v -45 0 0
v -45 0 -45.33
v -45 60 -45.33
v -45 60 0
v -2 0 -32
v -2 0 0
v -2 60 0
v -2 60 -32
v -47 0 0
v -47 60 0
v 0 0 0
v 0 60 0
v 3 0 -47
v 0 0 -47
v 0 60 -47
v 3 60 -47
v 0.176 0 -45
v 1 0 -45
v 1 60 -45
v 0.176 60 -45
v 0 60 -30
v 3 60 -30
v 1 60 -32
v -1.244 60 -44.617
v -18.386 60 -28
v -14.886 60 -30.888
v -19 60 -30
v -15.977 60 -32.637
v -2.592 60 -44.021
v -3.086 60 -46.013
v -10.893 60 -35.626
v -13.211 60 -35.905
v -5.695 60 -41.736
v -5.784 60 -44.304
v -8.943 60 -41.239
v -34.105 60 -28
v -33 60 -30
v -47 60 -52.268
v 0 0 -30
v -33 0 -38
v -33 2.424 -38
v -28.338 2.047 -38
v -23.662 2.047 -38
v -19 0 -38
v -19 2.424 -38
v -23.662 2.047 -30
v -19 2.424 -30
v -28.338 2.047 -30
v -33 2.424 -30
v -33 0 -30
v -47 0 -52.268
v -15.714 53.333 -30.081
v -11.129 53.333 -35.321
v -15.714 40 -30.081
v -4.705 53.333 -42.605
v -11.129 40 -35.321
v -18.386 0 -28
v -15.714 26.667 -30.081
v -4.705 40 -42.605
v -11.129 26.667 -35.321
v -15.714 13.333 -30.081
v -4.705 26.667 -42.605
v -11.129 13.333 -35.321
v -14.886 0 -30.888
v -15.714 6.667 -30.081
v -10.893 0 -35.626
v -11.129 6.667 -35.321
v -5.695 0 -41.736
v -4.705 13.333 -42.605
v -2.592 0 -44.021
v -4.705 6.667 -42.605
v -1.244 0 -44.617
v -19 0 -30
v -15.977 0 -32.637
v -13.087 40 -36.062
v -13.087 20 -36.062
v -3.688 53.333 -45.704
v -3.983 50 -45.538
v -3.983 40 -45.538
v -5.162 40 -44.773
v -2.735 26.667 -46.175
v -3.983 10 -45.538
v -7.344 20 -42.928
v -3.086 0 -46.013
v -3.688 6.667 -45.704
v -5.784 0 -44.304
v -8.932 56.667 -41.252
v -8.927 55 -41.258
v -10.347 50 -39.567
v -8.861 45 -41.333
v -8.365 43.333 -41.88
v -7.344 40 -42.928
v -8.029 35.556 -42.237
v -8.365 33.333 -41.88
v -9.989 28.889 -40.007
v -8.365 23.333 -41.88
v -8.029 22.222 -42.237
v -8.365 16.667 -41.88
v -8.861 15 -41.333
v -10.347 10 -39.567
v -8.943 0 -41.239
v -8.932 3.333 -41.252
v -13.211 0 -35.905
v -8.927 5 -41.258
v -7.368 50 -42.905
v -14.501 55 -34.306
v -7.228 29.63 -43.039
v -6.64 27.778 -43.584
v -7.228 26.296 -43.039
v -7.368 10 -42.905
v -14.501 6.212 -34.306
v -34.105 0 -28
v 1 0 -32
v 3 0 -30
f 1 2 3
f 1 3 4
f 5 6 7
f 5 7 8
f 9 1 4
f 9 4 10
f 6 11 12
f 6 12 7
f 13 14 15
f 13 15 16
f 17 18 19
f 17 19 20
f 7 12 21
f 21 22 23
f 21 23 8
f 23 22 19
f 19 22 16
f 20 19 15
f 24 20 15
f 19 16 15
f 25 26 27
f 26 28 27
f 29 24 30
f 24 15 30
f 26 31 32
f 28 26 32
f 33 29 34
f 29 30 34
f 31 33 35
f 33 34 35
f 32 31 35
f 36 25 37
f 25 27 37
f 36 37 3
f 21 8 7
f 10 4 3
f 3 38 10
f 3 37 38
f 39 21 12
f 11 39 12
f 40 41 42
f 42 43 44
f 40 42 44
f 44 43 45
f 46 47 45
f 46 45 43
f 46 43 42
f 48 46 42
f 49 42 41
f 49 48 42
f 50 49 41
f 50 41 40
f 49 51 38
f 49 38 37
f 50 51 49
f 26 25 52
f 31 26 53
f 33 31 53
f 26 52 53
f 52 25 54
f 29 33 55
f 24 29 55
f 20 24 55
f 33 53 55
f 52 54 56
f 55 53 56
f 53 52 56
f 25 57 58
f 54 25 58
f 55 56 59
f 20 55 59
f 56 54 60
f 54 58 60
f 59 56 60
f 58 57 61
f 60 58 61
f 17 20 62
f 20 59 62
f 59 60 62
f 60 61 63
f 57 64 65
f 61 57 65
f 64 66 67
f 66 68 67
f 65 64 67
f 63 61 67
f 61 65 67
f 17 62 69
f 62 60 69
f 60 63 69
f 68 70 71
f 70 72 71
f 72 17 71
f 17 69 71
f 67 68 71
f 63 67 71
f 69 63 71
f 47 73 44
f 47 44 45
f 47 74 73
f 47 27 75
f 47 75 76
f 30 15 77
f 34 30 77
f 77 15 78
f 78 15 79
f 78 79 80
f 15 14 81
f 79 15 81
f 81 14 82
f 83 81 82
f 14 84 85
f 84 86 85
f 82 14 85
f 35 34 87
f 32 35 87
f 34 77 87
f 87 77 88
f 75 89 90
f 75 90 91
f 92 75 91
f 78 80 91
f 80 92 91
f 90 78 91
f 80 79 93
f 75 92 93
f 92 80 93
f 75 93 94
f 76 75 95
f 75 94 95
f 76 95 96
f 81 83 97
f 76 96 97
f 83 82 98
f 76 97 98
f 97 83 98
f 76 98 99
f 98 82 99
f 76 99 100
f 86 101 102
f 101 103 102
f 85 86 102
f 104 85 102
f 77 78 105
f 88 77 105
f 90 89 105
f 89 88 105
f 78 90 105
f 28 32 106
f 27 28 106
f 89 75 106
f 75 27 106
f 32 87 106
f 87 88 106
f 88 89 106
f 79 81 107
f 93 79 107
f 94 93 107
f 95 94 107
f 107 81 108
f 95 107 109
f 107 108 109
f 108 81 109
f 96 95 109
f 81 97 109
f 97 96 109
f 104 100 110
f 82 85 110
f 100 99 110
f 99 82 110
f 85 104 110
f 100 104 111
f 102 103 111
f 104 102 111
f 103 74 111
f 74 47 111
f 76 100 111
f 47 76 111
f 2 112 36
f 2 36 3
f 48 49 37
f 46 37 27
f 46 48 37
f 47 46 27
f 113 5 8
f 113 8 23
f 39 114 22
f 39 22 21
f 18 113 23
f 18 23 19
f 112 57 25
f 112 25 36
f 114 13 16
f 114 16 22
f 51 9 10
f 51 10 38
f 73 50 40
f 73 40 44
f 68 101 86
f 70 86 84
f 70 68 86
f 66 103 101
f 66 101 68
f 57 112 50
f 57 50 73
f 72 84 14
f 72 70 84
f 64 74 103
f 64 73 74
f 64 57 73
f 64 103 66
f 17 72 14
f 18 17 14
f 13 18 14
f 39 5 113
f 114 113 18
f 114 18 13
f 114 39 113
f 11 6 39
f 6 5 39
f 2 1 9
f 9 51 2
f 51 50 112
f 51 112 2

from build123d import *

# Parameters (mm, degrees)
BOSS_EXTRUDE12_DEPTH = 60
BOSS_EXTRUDE13_DEPTH = 8


with BuildPart() as part:
    # Sketch1 → Boss-Extrude12 (new body)
    with BuildSketch(Plane(origin=(0, 0, 0), x_dir=(1, 0, 0), z_dir=(0, 1, 0))):
        with BuildLine():
            Line((3, 47), (3, 30))
            Line((3, 30), (0, 30))
            Line((0, 30), (0, 0))
            Line((0, 0), (-2, 0))
            Line((-2, 0), (-2, 32))
            Line((-2, 32), (1, 32))
            Line((1, 32), (1, 45))
            Line((1, 45), (0.176102142, 45))
            add(Edge.make_bspline(
                [(-18.386432119, 28), (-18.281589374, 28.071011485), (-18.076006872, 28.210643772), (-17.632017964, 28.509033814), (-16.788752159, 29.127765228), (-15.266101597, 30.436706514), (-13.281769764, 32.578807621), (-11.116323446, 35.322397153), (-8.327983452, 38.971629637), (-4.796332276, 42.989291988), (-1.605396872, 44.667429051), (0.176102142, 45)],
                knots=[0.007315744, 0.007315744, 0.007315744, 0.007315744, 0.023228008, 0.039140272, 0.0709648, 0.134613856, 0.261911967, 0.389210078, 0.516508189, 0.771104411, 1.025700634, 1.025700634, 1.025700634, 1.025700634], degree=3))
            Line((-18.386432119, 28), (-34.105031298, 28))
            Line((-34.105031298, 28), (-45, 45.32952773))
            Line((-45, 45.32952773), (-45, 0))
            Line((-45, 0), (-47, 0))
            Line((-47, 0), (-47, 52.268387809))
            Line((-47, 52.268387809), (-33, 30))
            Line((-33, 30), (-19, 30))
            add(Edge.make_bspline(
                [(0, 47), (-8.735842334, 45.522262704), (-12.411198706, 34.462689008), (-19, 30)],
                knots=[0, 0, 0, 0, 1, 1, 1, 1], degree=3))
            Line((0, 47), (3, 47))
        make_face()
    extrude(amount=BOSS_EXTRUDE12_DEPTH)

    # Sketch2 → Boss-Extrude13 (add)
    with BuildSketch(Plane(origin=(0, 0, -30), x_dir=(-1, 0, 0), z_dir=(0, 0, -1))):
        with BuildLine():
            Line((33, 0), (19, 0))
            Line((19, 0), (19, 2.423963318))
            ThreePointArc((19, 2.423963318), (26, 2), (33, 2.423963318))
            Line((33, 2.423963318), (33, 0))
        make_face()
    extrude(amount=BOSS_EXTRUDE13_DEPTH)


solid = part.part
